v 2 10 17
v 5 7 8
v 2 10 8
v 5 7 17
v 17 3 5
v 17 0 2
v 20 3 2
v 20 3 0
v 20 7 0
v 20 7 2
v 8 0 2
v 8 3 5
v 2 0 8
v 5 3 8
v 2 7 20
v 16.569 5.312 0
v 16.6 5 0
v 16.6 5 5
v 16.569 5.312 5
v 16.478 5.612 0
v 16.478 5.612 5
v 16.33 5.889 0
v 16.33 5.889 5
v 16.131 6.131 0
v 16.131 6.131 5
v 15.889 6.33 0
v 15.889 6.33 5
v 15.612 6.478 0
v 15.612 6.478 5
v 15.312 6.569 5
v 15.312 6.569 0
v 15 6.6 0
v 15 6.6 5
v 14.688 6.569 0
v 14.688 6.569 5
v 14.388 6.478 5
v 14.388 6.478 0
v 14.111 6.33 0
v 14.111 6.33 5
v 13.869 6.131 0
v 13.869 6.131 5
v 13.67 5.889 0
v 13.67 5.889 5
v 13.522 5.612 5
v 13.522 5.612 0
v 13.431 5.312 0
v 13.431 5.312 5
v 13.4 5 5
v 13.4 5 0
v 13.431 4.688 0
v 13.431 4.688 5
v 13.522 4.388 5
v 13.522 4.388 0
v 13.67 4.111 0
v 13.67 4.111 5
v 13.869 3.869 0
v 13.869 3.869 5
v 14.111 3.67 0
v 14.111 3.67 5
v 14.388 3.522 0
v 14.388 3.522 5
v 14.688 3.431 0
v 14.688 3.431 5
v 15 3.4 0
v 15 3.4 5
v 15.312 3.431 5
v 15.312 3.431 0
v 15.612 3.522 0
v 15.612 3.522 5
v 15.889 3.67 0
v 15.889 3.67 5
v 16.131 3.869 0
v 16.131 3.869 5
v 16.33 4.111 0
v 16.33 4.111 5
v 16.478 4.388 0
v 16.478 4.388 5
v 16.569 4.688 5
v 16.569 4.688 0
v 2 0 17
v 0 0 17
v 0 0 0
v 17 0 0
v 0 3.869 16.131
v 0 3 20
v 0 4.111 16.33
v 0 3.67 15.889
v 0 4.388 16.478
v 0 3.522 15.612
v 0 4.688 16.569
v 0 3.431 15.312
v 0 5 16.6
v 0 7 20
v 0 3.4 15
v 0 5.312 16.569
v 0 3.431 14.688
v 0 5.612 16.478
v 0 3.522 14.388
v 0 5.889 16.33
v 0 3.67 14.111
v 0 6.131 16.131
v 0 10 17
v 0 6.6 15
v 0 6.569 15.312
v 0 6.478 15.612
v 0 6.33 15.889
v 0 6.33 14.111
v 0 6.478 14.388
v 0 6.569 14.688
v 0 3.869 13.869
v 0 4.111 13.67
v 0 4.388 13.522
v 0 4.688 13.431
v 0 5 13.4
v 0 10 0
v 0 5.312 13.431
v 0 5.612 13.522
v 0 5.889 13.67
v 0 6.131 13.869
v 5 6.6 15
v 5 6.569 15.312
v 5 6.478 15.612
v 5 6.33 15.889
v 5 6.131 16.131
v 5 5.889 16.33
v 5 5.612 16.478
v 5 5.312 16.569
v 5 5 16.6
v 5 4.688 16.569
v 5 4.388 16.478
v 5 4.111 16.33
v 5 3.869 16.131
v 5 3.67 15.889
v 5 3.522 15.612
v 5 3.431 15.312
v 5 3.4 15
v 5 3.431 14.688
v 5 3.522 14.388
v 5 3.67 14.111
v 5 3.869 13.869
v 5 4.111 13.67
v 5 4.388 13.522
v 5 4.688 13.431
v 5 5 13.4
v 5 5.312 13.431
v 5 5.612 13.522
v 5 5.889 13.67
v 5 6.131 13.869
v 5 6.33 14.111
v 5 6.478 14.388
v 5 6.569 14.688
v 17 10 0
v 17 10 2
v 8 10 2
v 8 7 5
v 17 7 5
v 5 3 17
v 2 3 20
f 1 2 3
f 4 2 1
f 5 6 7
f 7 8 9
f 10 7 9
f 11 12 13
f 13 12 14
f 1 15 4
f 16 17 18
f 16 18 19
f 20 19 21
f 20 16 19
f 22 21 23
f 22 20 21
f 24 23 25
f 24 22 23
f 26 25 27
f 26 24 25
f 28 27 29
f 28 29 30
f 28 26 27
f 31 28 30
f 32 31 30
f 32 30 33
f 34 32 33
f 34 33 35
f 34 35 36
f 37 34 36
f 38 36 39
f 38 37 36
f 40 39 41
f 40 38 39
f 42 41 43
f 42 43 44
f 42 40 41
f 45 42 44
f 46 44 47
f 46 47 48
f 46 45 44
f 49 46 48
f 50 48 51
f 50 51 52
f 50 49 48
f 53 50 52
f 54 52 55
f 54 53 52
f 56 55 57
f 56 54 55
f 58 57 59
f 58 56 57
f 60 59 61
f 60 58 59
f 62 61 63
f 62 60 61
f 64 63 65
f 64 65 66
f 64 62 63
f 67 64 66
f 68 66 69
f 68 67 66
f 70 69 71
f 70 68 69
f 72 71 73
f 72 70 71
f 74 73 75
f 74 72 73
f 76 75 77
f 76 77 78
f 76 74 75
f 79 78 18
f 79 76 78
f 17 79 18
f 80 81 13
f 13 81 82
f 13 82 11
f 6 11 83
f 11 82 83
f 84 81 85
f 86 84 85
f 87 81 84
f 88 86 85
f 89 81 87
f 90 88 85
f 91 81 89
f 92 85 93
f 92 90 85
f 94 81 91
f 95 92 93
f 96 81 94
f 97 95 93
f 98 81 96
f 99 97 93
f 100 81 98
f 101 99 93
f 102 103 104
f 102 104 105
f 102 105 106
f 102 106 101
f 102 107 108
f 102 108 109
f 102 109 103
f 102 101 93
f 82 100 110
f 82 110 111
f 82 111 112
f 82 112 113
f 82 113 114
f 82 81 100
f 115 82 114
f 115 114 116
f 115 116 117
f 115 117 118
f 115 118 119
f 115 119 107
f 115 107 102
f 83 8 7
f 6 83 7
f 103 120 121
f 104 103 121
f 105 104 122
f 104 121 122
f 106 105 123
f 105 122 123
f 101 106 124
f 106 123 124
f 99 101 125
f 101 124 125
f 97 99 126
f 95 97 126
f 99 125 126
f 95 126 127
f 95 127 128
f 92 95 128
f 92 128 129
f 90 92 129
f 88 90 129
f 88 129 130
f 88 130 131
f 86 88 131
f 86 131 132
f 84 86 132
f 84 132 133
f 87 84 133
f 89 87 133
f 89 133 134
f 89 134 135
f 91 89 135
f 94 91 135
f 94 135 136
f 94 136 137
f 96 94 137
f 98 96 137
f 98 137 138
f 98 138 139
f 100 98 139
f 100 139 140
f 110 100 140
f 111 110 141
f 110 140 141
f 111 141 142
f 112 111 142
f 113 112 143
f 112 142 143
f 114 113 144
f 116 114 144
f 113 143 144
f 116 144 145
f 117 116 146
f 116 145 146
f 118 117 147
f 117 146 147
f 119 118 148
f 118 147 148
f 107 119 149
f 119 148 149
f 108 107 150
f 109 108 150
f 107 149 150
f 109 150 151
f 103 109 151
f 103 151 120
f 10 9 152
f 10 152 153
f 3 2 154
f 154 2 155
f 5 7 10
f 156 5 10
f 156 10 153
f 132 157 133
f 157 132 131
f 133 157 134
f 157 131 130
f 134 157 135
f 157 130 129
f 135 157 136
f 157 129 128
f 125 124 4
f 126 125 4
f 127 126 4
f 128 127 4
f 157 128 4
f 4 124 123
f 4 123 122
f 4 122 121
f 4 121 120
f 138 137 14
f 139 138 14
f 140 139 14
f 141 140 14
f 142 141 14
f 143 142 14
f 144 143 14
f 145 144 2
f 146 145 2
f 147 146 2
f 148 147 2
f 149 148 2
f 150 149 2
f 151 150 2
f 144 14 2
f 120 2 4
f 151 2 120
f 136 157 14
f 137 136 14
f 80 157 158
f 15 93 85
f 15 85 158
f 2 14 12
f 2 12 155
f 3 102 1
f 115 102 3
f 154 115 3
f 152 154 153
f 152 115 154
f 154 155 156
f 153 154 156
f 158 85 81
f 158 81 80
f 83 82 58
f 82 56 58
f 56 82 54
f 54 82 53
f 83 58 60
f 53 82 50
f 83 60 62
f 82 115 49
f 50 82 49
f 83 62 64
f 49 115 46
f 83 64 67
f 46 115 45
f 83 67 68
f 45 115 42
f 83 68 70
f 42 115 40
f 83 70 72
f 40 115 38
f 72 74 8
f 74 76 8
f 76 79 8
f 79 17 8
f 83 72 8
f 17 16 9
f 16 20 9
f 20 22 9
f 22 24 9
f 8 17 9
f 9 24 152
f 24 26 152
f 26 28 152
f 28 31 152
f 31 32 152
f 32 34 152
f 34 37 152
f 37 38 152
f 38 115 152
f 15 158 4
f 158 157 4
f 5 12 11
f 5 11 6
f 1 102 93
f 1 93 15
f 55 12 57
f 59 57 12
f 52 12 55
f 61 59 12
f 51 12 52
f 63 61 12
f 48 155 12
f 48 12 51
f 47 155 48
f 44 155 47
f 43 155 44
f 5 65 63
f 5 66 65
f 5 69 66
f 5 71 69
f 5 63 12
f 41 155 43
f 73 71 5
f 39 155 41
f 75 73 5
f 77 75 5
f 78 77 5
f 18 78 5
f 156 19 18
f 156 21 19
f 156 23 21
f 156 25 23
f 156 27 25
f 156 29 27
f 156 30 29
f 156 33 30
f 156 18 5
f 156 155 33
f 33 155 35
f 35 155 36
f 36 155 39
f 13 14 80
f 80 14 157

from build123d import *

# Parameters (mm, degrees)
SKIZZE1_W                       = 15
SKIZZE1_H                       = 10
SKIZZE1_R                       = 1.6
AUFSATZ_LINEAR_AUSTRAGEN1_DEPTH = 5
SKIZZE1_9_W                     = 5
SKIZZE1_9_H                     = 10
AUFSATZ_LINEAR_AUSTRAGEN2_DEPTH = 20
SKIZZE3_R                       = 1.6
SCHNITT_LINEAR_AUSTRAGEN2_DEPTH = 20
FASE1_SIZE                      = 3


with BuildPart() as part:
    # Skizze1 → Aufsatz-Linear austragen1 (new body)
    with BuildSketch(Plane.XY):
        with Locations((12.5, 5)):
            Rectangle(SKIZZE1_W, SKIZZE1_H)
        with Locations((15, 5)):
            Circle(SKIZZE1_R, mode=Mode.SUBTRACT)
    extrude(amount=AUFSATZ_LINEAR_AUSTRAGEN1_DEPTH)

    # Skizze1<9> → Aufsatz-Linear austragen2 (add)
    with BuildSketch(Plane.XY):
        with Locations((2.5, 5)):
            Rectangle(SKIZZE1_9_W, SKIZZE1_9_H)
    extrude(amount=AUFSATZ_LINEAR_AUSTRAGEN2_DEPTH)

    # Skizze3 → Schnitt-Linear austragen2 (cut)
    with BuildSketch(Plane(origin=(5, 0, 0), x_dir=(0, 0, -1), z_dir=(1, 0, 0))):
        with Locations((-15, 5)):
            Circle(SKIZZE3_R)
    extrude(amount=-SCHNITT_LINEAR_AUSTRAGEN2_DEPTH, mode=Mode.SUBTRACT)

    # Fase1
    fase1_edges = [part.edges().sort_by_distance(p)[0] for p in [
        (5, 5, 5),
        (20, 10, 2.5),
        (20, 0, 2.5),
        (2.5, 0, 20),
        (2.5, 10, 20),
        (5, 10, 12.5),
        (5, 5, 20),
        (5, 0, 12.5),
        (12.5, 10, 5),
        (12.5, 0, 5),
        (20, 5, 5),
    ]]
    chamfer(fase1_edges, length=FASE1_SIZE)


solid = part.part
